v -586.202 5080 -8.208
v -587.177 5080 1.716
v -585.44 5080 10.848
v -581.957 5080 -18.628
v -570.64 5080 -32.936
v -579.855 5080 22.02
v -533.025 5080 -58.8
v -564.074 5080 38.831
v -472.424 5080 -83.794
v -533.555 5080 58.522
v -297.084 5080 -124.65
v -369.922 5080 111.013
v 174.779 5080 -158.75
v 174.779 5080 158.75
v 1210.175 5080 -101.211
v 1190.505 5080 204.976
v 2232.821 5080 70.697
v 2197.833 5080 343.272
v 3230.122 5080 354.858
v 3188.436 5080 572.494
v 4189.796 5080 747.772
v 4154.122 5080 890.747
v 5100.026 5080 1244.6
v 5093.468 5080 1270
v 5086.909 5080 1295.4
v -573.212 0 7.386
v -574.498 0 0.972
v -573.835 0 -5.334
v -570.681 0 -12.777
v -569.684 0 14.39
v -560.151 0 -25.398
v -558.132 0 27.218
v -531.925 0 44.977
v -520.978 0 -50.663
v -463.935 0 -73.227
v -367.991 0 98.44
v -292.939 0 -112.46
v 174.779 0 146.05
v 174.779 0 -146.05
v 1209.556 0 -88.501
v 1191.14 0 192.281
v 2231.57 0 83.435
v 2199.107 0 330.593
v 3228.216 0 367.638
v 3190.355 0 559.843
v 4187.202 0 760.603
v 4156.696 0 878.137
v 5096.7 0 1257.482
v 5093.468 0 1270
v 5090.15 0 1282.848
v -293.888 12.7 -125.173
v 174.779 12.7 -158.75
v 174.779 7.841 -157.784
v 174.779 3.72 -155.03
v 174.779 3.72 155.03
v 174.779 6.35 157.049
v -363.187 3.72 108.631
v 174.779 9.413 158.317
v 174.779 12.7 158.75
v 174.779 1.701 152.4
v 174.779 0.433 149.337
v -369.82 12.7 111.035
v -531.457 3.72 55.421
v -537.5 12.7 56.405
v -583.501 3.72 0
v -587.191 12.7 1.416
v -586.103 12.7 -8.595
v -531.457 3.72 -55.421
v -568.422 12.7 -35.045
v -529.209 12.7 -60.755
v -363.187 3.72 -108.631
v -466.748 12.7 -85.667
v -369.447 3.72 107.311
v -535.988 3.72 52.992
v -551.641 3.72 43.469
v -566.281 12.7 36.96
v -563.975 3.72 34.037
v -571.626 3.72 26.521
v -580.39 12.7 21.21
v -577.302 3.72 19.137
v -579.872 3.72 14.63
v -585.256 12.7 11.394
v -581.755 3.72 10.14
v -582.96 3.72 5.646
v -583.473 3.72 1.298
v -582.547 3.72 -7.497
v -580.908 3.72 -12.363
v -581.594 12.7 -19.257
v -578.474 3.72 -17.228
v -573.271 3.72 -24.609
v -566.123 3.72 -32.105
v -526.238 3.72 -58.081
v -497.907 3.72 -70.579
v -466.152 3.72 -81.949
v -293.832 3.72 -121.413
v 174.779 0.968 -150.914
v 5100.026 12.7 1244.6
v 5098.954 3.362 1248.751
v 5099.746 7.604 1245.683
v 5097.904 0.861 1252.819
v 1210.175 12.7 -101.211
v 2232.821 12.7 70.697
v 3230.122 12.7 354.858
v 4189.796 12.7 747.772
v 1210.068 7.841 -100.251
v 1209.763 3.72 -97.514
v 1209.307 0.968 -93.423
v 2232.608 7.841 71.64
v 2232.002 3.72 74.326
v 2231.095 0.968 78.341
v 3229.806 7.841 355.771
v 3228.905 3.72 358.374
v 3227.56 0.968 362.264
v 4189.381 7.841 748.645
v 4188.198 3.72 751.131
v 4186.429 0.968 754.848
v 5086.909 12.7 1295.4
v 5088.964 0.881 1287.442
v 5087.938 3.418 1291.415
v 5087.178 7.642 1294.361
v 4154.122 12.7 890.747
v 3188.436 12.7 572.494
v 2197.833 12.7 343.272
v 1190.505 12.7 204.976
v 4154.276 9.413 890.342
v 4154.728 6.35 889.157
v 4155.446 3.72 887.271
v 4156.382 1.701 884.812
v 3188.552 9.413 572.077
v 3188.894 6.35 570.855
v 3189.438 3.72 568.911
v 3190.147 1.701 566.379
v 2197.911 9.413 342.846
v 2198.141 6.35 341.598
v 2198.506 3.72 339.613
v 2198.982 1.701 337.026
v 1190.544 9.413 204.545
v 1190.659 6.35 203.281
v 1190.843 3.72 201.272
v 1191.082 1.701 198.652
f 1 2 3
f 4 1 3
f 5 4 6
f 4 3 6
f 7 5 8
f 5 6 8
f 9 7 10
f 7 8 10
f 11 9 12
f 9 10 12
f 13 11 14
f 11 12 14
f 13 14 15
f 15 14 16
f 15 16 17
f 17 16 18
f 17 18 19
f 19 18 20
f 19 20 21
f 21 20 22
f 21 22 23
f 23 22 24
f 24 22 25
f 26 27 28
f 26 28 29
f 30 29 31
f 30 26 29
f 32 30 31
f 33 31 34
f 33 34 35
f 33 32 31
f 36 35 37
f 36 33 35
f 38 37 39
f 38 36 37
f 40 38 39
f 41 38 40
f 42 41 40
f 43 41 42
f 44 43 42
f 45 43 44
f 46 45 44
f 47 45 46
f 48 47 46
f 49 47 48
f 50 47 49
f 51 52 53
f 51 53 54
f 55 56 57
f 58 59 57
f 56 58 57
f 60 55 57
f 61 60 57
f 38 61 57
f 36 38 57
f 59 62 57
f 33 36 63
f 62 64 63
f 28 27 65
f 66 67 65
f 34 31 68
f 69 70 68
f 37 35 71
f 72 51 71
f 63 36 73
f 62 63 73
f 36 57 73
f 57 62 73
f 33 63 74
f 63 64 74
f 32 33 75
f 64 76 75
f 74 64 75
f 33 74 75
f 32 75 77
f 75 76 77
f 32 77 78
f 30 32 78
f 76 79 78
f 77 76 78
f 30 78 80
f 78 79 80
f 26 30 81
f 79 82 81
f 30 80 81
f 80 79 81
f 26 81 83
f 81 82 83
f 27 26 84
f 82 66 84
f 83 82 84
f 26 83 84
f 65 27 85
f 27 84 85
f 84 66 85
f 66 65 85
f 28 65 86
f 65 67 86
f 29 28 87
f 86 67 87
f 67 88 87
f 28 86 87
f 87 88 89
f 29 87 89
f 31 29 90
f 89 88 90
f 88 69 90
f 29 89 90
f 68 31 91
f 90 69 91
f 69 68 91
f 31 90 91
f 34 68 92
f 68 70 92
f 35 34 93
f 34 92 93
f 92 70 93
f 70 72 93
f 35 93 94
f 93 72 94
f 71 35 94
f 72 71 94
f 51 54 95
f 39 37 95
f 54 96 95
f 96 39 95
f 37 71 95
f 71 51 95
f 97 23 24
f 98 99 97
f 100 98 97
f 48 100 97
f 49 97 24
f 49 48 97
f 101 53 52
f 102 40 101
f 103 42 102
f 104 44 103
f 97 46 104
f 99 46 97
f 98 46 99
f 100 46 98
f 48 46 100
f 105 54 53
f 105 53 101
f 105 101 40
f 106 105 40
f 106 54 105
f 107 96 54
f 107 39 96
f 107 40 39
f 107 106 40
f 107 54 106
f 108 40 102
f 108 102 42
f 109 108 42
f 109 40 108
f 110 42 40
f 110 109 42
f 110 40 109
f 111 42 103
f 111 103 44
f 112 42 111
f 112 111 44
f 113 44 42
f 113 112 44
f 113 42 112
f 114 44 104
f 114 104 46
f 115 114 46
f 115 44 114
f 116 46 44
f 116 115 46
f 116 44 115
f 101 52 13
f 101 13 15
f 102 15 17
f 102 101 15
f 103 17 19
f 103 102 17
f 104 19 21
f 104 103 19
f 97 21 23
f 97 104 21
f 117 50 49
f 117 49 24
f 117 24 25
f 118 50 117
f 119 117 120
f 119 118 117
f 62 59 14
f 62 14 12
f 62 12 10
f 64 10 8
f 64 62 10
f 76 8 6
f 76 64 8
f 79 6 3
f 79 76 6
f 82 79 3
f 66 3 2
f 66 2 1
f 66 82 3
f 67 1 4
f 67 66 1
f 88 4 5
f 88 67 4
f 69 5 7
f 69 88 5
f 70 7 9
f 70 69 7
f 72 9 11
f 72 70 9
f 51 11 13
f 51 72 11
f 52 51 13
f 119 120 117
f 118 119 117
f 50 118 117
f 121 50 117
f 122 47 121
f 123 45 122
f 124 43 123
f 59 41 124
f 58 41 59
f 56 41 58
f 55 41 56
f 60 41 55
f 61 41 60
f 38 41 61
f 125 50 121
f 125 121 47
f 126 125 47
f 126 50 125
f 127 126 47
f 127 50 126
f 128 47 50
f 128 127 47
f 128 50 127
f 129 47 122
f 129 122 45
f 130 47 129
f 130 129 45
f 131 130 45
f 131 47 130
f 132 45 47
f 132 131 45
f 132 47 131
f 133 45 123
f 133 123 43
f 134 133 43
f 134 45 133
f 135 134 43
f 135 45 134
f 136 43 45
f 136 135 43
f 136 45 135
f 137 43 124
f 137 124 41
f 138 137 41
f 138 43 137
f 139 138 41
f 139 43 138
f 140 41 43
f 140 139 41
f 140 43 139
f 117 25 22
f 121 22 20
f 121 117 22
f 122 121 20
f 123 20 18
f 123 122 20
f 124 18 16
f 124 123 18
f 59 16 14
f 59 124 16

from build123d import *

# Parameters (mm, degrees)
F1_DEPTH = 5080
F2_R     = 12.7


with BuildPart() as f1:
    # F0 (on Front) → F1 (new body)
    with BuildSketch(Plane.XZ):
        with BuildLine():
            ThreePointArc((5086.9094941625, 1295.4), (2695.7410257625, 446.6177730519), (174.7788962786, 158.75))
            add(Edge.make_bspline(
                [(174.7788962786, 158.75), (-587.2211037214, 158.75), (-587.2211037214, 0), (-587.2211037214, -158.75), (174.7788962786, -158.75)],
                knots=[4.7123889804, 4.7123889804, 4.7123889804, 6.2831853072, 6.2831853072, 7.853981634, 7.853981634, 7.853981634], degree=2, weights=[1, 0.7071067812, 1, 0.7071067812, 1]))
            ThreePointArc((174.7788962786, -158.75), (2735.4160354086, 198.9330221497), (5100.0259977616, 1244.6))
            Line((5100.0259977616, 1244.6), (5093.467745962, 1270))
            Line((5093.467745962, 1270), (5086.9094941625, 1295.4))
        make_face()
    extrude(amount=-F1_DEPTH)

    # F2
    f2_edges = [f1.edges().sort_by_distance(p)[0] for p in [
        (2695.741026, 0, 446.617773),
        (-587.221104, 0, 0),
        (2735.416035, 0, 198.933022),
    ]]
    fillet(f2_edges, radius=F2_R)


with BuildPart() as f3_1:
    # F3: copy of F1
    add(f1.part)


with BuildPart() as f5_1:
    # F5: copy of F1
    add(f1.part.moved(Location((0, 0, 993.14))))


solid = f1.part
